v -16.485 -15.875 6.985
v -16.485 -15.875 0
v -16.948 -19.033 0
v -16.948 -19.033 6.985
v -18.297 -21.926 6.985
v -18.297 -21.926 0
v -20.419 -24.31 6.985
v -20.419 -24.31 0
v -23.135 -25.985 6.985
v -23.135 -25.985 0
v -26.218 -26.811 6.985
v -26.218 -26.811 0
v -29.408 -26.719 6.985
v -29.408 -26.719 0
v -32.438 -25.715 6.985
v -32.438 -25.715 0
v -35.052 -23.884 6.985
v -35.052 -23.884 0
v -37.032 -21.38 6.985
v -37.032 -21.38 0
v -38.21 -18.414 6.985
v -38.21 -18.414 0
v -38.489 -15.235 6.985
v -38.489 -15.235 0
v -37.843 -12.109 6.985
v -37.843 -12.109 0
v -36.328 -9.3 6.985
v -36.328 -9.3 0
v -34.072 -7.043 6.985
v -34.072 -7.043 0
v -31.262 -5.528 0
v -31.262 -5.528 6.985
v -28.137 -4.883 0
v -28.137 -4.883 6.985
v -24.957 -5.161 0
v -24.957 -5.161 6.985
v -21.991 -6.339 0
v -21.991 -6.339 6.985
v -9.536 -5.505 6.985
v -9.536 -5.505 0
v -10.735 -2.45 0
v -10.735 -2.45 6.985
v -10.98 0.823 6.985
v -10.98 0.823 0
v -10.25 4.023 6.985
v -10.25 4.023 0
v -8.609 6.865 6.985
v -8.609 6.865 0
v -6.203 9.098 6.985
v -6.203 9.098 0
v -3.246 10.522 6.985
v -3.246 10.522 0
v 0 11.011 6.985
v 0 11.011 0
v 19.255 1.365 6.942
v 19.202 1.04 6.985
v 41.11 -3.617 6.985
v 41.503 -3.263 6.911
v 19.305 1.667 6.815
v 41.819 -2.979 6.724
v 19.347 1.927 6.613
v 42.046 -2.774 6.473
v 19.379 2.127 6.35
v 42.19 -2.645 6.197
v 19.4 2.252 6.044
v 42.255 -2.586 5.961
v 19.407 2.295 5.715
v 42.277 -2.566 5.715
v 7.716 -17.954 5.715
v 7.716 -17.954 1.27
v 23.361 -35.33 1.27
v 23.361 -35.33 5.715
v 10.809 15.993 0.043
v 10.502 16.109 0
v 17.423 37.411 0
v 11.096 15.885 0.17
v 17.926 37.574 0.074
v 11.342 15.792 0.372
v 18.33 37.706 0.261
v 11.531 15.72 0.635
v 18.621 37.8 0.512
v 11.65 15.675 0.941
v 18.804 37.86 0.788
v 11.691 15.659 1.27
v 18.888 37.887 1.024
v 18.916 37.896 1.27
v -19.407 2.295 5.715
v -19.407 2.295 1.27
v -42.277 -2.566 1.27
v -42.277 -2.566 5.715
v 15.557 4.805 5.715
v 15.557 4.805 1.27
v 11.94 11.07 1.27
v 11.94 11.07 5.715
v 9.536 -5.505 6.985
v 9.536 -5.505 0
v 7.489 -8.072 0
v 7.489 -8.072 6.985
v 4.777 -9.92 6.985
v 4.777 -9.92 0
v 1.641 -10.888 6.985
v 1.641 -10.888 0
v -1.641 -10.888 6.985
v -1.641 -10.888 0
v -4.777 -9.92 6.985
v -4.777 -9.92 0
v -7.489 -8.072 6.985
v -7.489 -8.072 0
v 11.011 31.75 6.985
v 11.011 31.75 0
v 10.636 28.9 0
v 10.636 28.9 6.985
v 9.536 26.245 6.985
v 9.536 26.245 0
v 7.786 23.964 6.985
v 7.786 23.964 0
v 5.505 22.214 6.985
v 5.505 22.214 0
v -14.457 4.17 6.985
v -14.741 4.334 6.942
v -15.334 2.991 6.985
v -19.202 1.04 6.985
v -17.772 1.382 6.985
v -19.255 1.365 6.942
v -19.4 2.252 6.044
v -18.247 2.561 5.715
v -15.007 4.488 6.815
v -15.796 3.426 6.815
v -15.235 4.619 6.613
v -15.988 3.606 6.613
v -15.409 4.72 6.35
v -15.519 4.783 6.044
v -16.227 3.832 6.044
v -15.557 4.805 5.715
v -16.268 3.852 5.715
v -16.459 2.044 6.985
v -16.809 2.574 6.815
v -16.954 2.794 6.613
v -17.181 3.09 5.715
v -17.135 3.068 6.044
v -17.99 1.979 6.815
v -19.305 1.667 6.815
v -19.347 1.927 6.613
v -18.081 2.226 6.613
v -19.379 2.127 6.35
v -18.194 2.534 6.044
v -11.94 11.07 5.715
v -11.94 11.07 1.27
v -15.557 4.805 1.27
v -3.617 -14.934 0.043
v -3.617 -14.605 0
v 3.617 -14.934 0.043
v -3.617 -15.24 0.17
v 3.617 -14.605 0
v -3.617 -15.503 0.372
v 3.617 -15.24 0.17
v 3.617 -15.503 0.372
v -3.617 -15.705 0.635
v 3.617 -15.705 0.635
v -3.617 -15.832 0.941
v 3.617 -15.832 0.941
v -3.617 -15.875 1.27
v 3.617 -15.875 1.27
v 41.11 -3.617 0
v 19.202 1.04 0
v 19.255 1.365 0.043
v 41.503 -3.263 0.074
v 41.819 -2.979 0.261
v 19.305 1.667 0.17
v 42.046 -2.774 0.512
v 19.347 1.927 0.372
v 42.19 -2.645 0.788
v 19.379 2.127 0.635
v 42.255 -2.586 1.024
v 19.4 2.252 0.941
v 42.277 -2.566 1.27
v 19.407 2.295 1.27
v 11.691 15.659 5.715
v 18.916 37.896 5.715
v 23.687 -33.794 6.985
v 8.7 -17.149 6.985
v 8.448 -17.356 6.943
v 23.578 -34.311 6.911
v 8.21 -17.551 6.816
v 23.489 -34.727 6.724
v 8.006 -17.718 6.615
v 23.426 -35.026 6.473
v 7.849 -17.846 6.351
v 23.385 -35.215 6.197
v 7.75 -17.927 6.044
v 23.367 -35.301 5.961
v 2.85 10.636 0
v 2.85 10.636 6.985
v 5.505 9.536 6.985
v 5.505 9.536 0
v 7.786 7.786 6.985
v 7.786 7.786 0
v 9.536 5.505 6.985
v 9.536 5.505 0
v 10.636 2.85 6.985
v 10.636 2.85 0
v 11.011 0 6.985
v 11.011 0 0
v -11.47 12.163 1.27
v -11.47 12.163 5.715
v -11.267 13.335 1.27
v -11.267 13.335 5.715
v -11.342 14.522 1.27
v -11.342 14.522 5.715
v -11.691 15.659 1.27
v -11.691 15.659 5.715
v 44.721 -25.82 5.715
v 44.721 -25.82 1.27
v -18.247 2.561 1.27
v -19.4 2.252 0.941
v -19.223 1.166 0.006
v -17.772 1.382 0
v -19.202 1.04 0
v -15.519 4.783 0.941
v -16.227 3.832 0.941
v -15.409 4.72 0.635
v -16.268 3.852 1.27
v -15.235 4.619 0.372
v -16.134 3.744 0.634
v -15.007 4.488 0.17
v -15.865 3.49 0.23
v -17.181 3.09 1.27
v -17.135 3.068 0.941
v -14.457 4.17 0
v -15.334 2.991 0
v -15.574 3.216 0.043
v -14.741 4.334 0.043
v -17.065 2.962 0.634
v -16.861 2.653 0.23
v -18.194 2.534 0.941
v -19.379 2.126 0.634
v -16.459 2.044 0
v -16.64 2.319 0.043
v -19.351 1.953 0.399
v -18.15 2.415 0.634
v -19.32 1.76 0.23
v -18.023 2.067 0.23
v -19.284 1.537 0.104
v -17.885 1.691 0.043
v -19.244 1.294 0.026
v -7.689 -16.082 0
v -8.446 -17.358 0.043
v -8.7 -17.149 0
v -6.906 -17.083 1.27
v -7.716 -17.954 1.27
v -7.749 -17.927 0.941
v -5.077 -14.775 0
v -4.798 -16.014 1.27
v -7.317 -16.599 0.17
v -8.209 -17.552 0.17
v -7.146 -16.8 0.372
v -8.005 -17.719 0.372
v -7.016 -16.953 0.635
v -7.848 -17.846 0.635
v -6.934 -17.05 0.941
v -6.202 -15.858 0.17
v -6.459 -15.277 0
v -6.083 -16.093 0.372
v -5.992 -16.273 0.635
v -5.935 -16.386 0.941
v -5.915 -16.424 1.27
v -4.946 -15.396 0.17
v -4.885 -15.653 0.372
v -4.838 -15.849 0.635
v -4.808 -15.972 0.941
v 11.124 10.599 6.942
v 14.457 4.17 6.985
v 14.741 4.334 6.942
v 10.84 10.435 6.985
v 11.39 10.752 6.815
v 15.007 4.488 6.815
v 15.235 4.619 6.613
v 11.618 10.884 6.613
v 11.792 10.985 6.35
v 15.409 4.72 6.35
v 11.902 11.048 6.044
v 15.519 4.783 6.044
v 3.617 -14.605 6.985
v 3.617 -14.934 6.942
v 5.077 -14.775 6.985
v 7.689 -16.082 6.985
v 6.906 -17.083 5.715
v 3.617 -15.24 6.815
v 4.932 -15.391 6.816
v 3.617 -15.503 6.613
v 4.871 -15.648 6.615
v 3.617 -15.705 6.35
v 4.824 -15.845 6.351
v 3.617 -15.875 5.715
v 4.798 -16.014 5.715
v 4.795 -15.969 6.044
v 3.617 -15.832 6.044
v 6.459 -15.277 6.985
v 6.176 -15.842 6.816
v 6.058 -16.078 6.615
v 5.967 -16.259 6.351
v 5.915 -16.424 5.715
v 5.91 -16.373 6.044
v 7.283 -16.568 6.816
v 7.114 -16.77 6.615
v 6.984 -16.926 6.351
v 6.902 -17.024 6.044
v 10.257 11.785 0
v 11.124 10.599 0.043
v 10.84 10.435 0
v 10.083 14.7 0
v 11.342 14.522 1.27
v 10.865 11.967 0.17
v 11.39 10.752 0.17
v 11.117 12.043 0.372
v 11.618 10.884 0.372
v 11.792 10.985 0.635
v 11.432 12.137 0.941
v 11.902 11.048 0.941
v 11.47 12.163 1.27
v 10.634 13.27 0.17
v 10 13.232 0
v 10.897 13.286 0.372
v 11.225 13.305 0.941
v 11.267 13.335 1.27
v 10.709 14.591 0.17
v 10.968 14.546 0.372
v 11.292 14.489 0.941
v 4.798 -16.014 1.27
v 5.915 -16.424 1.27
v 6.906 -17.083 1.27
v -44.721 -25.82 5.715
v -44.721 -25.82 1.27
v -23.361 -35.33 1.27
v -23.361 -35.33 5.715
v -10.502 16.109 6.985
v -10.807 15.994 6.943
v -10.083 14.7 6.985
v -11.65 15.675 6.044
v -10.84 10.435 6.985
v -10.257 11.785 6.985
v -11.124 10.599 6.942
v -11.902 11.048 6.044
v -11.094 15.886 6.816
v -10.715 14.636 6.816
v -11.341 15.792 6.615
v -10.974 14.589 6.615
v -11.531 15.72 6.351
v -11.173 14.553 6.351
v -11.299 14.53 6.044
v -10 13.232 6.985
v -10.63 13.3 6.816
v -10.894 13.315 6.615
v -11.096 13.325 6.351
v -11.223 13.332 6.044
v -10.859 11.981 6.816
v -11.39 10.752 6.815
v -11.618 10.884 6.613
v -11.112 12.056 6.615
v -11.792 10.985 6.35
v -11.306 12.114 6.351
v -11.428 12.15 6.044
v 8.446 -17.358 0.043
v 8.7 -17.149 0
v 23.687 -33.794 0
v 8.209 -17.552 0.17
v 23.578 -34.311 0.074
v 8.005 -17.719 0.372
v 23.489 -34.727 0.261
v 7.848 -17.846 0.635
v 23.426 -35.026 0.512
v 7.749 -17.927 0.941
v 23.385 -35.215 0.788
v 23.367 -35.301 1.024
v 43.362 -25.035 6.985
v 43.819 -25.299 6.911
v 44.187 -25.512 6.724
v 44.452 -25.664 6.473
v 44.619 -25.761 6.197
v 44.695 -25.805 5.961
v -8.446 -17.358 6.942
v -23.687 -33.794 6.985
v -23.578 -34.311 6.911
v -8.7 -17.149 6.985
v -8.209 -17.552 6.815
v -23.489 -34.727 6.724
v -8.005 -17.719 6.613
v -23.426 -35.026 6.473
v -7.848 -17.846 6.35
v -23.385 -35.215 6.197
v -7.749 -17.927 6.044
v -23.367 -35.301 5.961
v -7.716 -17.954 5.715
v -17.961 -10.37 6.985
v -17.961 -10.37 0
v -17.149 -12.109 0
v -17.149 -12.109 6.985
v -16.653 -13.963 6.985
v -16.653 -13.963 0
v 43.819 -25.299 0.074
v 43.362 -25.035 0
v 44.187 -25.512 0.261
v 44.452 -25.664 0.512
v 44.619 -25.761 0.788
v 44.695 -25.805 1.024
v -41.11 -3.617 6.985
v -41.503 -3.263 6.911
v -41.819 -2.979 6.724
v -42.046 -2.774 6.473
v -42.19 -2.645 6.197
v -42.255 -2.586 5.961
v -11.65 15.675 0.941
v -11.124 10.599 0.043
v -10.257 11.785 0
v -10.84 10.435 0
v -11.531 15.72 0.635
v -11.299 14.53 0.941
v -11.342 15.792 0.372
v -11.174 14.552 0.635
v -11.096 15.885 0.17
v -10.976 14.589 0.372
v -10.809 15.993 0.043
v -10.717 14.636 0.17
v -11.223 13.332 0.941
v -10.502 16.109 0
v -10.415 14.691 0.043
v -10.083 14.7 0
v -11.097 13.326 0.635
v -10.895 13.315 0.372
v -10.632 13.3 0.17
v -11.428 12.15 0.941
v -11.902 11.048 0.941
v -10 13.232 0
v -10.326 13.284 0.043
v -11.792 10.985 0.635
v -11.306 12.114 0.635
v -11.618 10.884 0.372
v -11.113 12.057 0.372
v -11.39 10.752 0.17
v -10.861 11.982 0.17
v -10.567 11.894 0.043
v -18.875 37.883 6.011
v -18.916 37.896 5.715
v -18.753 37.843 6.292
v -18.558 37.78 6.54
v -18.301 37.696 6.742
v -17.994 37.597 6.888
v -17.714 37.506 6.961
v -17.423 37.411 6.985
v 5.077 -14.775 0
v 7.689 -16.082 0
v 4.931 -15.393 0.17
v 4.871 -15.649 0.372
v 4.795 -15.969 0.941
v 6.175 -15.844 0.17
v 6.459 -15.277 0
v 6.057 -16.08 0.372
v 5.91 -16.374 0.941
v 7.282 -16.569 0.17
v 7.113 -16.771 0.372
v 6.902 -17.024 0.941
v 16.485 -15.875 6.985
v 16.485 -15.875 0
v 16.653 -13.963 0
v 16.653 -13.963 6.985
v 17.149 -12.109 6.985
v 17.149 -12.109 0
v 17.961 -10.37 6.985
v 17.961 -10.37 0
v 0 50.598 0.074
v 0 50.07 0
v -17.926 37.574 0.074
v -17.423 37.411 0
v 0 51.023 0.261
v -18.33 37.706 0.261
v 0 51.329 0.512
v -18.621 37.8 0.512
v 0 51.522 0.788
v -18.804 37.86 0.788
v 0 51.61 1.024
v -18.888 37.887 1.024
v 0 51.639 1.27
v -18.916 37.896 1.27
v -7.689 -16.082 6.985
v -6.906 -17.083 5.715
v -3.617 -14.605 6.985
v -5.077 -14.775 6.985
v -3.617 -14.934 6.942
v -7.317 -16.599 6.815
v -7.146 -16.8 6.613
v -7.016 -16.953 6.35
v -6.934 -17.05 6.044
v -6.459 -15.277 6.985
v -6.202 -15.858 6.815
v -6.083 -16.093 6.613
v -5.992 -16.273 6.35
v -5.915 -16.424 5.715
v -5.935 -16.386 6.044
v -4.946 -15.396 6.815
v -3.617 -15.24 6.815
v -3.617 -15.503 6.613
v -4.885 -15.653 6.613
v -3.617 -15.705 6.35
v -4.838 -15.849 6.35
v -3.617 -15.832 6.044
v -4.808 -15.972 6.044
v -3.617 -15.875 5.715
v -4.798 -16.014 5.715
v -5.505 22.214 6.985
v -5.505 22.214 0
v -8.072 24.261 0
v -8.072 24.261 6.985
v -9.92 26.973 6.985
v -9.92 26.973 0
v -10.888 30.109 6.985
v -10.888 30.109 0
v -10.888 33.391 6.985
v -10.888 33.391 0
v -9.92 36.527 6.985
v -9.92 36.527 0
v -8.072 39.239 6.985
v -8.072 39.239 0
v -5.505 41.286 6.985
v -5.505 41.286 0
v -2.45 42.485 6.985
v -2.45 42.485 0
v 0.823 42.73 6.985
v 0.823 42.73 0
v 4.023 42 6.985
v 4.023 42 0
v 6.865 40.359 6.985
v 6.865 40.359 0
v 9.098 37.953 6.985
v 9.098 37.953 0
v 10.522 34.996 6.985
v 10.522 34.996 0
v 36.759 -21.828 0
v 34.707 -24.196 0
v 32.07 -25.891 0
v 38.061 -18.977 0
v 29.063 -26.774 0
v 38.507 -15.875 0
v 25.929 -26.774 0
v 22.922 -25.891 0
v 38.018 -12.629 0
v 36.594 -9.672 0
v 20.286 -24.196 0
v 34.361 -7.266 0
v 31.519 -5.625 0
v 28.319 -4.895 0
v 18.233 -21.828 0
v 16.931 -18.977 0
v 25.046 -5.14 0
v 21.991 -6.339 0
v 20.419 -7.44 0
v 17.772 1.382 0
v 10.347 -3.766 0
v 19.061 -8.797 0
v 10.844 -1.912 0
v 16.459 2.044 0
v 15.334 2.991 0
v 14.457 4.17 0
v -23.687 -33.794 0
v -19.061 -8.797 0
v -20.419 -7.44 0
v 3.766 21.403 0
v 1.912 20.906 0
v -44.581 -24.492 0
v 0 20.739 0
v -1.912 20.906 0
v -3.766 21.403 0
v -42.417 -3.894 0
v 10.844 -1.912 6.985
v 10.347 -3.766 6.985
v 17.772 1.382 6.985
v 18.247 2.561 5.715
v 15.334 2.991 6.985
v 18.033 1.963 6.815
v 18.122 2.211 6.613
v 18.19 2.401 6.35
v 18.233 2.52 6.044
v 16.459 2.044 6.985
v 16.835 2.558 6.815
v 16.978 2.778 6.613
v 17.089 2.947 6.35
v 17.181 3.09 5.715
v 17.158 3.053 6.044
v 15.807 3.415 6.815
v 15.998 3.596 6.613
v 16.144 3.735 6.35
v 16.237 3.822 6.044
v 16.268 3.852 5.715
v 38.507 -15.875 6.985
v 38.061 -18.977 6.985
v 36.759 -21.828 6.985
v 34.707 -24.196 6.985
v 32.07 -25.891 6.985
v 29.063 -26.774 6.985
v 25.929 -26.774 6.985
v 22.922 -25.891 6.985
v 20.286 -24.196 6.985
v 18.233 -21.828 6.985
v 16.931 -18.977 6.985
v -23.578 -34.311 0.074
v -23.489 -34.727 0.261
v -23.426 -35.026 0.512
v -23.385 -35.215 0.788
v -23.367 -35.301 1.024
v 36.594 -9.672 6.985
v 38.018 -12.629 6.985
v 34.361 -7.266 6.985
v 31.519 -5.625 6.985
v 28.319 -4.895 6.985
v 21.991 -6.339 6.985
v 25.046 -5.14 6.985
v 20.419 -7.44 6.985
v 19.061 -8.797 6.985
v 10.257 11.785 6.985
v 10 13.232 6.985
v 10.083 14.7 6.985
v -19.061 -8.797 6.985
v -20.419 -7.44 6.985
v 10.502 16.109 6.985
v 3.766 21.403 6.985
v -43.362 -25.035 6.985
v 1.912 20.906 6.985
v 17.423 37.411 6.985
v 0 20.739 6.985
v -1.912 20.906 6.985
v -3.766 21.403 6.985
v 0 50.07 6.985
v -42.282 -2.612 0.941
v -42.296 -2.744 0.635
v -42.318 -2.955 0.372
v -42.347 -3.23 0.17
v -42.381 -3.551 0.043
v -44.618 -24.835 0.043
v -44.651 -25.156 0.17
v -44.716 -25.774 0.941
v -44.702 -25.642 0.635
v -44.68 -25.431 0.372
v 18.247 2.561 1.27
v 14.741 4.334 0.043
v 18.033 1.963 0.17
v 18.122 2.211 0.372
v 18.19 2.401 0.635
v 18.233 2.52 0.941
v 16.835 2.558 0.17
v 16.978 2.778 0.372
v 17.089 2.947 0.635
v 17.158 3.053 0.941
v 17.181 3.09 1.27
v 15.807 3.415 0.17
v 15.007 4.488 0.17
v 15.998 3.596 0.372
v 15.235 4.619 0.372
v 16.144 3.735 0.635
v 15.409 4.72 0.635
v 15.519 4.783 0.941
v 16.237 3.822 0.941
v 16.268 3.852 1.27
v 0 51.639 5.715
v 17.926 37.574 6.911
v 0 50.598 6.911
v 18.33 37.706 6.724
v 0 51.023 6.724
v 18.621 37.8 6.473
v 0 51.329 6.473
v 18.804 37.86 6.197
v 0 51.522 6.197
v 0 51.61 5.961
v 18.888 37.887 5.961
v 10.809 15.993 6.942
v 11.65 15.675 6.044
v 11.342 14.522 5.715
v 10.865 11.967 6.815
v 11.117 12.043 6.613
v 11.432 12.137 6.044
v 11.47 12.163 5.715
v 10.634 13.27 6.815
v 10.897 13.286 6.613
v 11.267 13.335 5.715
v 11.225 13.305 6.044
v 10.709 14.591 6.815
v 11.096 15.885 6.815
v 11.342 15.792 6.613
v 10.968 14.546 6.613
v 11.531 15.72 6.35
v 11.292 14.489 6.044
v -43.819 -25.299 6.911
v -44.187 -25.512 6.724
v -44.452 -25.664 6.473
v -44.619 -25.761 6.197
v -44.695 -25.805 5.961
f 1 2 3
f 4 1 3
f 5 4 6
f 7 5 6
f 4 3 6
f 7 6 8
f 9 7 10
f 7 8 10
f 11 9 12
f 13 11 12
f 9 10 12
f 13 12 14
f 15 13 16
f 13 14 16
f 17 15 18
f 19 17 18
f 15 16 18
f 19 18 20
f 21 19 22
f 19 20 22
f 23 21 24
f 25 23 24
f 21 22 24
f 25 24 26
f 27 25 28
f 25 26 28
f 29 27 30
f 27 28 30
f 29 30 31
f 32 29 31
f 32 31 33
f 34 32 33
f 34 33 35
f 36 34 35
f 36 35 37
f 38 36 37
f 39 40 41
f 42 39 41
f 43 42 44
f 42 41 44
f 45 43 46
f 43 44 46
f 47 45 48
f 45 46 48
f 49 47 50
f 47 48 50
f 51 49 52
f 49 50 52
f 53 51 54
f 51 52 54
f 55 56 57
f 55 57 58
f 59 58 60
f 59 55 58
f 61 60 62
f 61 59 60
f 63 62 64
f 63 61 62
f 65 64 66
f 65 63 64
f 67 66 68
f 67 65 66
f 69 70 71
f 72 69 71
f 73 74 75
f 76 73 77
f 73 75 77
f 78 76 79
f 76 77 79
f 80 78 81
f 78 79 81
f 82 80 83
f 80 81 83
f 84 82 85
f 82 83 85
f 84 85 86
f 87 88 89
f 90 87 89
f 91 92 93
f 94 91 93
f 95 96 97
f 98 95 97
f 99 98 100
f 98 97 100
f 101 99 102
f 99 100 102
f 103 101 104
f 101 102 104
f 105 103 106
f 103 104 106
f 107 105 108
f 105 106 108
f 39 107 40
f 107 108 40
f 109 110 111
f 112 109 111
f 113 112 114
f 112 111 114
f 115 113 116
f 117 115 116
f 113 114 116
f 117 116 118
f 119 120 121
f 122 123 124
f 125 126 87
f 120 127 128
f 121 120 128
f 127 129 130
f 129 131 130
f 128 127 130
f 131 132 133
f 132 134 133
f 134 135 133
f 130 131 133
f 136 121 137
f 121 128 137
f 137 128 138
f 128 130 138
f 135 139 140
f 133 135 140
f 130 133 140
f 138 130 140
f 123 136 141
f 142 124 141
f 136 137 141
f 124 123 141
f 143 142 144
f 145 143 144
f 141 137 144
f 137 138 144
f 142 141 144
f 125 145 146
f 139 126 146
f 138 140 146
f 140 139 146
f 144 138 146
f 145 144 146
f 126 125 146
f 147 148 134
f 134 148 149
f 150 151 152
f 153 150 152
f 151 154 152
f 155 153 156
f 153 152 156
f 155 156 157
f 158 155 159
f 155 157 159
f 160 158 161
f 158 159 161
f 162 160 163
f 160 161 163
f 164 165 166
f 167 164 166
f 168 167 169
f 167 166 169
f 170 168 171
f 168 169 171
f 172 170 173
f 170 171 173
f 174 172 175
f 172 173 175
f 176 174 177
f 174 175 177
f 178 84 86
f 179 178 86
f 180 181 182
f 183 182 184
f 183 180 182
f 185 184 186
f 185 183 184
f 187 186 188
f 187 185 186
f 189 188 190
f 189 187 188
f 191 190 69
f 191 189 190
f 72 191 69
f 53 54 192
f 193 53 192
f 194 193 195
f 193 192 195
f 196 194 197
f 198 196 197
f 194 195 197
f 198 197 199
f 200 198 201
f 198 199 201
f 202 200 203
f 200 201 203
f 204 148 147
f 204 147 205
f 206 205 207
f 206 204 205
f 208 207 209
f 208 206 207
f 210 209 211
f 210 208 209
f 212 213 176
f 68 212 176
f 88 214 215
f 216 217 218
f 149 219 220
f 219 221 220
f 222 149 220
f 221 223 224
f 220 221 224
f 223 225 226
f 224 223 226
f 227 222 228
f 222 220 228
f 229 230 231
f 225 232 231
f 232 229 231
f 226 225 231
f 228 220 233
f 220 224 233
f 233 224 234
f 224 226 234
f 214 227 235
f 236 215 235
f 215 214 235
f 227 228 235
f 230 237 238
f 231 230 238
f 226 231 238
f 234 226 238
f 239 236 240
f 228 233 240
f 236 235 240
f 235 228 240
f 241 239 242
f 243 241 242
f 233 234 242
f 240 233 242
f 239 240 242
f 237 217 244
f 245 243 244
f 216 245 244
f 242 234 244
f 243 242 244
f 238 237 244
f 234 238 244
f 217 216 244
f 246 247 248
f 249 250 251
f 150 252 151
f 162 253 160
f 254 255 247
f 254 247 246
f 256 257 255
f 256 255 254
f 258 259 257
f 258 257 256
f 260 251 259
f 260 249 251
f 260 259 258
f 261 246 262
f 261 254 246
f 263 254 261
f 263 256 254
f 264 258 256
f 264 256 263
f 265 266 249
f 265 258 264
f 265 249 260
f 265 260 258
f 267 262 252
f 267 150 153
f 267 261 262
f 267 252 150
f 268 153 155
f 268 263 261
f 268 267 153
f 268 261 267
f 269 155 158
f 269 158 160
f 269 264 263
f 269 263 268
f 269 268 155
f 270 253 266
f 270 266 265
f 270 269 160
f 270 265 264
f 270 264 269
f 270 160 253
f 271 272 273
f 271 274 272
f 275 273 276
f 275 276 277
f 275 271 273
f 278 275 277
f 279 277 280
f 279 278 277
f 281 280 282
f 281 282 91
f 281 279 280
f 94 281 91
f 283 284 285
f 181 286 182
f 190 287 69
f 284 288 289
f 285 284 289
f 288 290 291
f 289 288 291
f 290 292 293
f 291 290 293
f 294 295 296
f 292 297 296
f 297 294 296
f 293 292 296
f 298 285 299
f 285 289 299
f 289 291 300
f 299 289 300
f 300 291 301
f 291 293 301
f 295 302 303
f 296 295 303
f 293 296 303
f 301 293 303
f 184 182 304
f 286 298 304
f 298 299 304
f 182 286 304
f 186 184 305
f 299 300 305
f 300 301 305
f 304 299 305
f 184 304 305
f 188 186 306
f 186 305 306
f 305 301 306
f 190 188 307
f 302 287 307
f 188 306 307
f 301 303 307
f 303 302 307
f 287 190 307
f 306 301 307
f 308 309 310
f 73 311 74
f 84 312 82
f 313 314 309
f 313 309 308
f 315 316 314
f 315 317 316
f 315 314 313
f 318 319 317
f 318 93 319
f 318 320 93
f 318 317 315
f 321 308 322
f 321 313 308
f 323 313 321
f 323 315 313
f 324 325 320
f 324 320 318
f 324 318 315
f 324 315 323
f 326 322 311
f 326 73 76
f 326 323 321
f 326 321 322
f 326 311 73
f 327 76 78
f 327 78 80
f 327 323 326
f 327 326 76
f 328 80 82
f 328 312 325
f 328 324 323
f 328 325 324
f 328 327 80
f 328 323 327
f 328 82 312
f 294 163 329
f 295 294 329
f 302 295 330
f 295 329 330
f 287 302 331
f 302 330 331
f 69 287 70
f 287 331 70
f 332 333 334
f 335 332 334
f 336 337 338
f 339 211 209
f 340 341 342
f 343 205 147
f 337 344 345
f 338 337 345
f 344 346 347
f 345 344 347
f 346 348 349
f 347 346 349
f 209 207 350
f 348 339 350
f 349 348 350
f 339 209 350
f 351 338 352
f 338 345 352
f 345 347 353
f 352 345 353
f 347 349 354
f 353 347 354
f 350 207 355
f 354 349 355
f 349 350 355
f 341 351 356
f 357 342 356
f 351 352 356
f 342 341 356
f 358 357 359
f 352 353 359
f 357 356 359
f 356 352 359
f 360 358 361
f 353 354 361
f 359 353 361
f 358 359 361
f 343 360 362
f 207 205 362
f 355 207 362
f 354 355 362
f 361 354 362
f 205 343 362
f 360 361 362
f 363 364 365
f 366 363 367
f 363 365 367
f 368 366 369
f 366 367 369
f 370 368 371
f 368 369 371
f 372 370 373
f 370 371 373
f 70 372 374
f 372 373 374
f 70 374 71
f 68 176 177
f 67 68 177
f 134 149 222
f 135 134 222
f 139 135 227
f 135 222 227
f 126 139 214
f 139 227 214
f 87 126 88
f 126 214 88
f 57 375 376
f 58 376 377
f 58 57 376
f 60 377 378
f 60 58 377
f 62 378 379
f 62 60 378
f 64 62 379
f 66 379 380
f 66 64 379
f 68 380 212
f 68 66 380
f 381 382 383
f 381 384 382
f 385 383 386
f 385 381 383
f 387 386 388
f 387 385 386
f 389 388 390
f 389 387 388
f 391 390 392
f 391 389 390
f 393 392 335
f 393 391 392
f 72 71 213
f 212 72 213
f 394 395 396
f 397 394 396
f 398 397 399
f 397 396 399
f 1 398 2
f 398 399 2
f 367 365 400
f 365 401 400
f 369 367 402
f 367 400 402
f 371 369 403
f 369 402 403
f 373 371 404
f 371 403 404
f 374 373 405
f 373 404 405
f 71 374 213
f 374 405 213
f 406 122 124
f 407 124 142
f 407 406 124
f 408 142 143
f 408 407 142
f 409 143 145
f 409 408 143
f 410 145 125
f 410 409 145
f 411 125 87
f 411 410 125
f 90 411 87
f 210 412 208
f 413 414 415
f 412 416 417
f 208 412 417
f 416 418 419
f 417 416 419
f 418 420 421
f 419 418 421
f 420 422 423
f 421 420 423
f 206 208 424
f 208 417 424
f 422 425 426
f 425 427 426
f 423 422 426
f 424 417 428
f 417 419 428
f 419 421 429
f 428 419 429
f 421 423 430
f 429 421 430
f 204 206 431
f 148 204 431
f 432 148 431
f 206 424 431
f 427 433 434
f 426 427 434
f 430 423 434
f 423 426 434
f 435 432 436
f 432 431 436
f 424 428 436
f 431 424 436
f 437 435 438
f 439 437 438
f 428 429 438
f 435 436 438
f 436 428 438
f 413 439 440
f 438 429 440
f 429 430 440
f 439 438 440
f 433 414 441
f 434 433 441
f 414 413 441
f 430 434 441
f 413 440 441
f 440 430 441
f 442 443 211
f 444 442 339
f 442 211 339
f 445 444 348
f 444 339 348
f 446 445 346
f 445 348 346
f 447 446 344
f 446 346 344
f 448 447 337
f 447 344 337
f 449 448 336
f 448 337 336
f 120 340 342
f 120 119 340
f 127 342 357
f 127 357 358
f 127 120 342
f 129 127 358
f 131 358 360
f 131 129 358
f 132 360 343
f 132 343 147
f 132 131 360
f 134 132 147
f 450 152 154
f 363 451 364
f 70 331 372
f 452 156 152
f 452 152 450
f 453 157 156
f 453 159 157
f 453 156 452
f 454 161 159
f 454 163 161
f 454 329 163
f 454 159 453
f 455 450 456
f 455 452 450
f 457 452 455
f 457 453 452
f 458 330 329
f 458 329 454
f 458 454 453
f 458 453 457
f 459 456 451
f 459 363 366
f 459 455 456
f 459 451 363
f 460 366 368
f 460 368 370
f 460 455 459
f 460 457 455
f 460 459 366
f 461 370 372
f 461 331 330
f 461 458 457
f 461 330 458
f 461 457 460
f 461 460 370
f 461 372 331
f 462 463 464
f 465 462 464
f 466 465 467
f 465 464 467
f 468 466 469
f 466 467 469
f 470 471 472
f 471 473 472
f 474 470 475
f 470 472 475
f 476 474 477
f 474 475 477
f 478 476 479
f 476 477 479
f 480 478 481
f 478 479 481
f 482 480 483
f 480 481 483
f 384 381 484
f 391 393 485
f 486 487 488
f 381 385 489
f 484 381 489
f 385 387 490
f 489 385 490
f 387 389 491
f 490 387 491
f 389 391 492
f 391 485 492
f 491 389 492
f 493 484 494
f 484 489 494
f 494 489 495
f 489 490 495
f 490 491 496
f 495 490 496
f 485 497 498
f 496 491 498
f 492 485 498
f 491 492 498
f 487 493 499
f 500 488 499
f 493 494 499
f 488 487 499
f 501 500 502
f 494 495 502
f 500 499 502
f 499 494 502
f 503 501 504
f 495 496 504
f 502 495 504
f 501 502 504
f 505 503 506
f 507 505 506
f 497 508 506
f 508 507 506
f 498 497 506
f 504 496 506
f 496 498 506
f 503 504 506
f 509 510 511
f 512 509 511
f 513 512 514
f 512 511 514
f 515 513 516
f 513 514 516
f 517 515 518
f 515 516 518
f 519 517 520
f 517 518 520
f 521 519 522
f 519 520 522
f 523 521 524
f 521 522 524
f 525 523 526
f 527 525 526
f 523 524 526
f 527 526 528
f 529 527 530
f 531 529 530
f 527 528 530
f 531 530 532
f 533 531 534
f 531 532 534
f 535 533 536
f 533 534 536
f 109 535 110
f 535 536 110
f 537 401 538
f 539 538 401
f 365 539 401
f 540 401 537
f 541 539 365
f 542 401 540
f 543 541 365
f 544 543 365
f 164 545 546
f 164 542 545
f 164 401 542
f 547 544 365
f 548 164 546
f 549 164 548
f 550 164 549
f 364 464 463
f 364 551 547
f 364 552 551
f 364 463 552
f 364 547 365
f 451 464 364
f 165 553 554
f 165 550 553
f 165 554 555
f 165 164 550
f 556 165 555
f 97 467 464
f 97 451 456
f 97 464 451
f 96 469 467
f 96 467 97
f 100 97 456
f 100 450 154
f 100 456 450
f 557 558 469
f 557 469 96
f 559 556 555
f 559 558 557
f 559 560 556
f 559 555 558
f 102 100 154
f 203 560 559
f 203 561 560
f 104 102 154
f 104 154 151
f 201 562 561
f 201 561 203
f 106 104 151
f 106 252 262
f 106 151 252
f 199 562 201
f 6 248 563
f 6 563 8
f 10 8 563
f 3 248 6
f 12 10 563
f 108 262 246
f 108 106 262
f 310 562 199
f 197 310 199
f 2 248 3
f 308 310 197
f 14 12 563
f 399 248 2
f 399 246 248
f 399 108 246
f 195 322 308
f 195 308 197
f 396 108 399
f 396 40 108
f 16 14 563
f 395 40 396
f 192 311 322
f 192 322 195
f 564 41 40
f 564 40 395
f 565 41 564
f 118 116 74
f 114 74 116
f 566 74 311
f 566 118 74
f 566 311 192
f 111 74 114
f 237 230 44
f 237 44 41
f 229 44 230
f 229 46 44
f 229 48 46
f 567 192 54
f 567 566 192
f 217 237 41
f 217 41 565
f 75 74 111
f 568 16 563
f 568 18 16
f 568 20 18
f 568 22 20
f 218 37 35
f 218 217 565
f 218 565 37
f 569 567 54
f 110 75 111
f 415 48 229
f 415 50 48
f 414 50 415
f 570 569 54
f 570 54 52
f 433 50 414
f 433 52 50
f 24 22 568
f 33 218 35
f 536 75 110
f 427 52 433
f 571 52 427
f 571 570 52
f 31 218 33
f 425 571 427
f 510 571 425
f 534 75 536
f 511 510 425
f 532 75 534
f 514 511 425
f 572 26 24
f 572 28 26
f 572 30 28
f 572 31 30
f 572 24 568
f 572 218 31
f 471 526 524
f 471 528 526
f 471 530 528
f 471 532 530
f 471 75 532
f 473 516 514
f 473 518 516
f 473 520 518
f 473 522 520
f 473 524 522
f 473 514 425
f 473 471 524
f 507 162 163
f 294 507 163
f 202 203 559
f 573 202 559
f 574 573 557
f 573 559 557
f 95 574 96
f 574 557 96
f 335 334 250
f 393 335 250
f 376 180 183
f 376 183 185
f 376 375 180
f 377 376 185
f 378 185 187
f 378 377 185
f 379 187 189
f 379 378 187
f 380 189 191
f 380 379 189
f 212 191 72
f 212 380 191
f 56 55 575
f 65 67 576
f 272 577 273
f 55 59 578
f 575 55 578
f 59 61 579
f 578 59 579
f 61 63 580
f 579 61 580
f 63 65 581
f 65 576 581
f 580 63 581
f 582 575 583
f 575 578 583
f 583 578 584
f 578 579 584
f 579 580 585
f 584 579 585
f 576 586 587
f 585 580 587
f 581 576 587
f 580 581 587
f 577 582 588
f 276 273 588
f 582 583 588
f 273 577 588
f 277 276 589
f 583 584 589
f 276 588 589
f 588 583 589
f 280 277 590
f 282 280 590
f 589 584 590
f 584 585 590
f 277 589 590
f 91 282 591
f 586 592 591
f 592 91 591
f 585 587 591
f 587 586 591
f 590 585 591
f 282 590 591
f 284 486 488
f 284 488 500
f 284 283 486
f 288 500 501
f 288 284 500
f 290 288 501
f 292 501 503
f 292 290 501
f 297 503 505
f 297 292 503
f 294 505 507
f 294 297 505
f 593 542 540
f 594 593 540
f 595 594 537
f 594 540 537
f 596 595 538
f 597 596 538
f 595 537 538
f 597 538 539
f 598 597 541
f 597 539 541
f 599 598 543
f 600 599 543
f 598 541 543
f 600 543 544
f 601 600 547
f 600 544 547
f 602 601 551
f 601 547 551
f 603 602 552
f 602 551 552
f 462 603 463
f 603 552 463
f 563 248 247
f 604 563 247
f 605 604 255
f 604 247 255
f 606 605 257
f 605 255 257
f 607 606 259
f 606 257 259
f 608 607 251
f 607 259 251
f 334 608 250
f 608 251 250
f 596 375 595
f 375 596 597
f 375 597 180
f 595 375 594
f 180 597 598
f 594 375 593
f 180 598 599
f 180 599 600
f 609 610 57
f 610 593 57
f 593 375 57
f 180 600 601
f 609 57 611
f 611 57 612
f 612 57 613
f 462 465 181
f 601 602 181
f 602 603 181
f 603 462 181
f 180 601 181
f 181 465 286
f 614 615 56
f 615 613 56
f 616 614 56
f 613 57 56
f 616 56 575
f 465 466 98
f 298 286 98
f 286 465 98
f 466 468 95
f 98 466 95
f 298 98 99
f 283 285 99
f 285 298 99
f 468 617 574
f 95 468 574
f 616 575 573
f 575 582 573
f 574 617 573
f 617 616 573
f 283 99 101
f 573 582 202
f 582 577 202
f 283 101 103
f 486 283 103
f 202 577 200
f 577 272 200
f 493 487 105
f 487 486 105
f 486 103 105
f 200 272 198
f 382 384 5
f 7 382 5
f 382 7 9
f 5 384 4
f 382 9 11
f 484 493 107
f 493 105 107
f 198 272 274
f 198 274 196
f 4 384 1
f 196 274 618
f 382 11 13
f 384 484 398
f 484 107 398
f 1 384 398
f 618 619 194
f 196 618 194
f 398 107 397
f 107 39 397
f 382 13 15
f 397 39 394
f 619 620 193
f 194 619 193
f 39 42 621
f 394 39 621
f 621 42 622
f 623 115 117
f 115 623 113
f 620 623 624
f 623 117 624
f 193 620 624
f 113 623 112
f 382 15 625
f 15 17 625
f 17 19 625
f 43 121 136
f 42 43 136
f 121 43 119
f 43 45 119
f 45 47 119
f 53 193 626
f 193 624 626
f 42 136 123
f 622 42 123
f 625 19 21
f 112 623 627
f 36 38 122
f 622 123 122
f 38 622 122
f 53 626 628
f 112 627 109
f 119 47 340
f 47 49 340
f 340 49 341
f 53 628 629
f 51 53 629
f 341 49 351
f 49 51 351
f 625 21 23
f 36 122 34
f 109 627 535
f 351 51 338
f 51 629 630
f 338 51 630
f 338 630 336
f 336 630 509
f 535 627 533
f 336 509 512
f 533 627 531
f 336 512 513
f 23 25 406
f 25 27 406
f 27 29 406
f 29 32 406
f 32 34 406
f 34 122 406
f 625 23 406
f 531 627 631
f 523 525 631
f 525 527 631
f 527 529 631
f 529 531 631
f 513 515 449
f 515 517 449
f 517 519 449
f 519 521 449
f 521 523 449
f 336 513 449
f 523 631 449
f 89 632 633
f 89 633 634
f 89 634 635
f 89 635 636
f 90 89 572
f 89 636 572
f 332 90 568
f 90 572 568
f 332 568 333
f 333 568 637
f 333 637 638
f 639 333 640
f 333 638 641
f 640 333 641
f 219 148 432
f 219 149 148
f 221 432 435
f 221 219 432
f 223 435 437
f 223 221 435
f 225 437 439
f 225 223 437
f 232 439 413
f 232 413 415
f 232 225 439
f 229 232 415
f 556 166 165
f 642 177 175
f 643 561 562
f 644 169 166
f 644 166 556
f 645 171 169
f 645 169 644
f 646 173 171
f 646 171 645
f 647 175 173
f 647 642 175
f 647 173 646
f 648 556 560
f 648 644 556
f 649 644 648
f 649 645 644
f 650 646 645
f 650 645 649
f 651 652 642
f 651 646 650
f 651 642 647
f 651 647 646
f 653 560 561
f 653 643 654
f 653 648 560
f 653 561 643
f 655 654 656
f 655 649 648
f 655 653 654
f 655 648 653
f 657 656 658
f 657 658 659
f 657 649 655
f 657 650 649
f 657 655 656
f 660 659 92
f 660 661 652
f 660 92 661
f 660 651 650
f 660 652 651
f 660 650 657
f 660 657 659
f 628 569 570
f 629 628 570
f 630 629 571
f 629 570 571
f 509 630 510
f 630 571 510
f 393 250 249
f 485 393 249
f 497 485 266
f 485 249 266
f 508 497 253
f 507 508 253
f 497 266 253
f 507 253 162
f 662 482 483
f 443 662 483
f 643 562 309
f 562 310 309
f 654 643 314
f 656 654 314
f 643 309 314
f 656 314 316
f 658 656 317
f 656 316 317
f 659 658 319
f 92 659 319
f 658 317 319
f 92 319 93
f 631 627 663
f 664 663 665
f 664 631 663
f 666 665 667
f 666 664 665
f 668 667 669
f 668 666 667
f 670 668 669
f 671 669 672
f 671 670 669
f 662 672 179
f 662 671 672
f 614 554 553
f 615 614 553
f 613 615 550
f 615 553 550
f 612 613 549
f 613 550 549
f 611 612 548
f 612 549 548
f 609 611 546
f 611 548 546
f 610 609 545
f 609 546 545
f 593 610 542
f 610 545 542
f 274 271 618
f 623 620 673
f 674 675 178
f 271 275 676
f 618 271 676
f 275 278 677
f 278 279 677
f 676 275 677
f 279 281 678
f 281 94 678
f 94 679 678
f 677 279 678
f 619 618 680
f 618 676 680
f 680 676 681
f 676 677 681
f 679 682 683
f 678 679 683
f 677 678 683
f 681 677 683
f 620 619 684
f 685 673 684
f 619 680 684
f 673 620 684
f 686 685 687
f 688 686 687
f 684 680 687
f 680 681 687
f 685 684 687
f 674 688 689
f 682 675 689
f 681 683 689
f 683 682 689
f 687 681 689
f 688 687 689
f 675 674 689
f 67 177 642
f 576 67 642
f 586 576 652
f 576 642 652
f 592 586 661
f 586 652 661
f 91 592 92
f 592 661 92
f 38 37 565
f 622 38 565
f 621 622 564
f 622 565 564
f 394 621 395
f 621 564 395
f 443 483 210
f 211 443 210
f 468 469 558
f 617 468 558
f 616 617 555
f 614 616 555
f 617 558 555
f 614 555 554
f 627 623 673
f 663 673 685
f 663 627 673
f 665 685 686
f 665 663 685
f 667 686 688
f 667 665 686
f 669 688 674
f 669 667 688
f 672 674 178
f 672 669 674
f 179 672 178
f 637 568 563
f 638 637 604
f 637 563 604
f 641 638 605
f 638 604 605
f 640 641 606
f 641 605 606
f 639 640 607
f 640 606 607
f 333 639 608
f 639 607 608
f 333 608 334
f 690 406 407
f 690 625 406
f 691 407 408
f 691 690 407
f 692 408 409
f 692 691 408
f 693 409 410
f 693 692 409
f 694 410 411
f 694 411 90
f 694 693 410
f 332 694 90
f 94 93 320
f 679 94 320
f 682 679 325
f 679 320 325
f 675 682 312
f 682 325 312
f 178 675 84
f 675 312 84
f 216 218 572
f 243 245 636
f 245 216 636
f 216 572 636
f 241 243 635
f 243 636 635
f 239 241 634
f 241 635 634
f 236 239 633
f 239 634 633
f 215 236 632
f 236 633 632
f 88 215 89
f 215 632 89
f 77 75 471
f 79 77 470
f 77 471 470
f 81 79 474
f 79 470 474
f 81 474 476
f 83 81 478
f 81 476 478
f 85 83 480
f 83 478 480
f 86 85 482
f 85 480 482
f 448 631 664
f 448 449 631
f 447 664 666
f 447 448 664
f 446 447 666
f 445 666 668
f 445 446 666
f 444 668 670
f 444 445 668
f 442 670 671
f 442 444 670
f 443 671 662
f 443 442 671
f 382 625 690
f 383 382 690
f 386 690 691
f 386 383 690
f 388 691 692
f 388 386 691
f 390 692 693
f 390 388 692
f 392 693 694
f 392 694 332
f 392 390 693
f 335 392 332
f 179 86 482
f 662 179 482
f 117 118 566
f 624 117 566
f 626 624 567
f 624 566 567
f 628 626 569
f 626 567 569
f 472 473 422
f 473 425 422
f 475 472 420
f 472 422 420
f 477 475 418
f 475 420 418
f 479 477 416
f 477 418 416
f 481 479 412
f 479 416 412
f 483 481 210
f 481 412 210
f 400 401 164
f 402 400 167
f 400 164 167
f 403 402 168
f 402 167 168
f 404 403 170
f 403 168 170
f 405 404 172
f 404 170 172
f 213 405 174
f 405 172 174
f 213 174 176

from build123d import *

# Parameters (mm, degrees)
F1_DEPTH    = 6.985
F2_T1_DEPTH = 6.985
F3_R        = 1.27
F4_R        = 1.27


# Not quite as in the source:
# - a fillet or chamfer that OpenCascade refuses, or shapes differently, is made with other operations: its cross-section is extruded or revolved along the edge and cut away or added
# - a feature names something its author has since deleted; it is built from what else it names


with BuildPart() as f1:
    # F0 (on Top) → F1 (new body)
    with BuildSketch(Plane.XY):
        with BuildLine():
            Line((0, 15.6591), (0, 11.0109))
            ThreePointArc((0, 11.0109), (7.785882057, 7.785882057), (11.0109, 0))
            ThreePointArc((11.0109, 0), (10.6357126807, -2.8498306237), (9.5357191185, -5.50545))
            Line((9.5357191185, -5.50545), (13.5611784004, -7.82955))
            Line((13.5611784004, -7.82955), (18.2062211237, 0.2159))
            Line((18.2062211237, 0.2159), (9.2900854465, 15.6591))
            Line((9.2900854465, 15.6591), (0, 15.6591))
        make_face()
        with BuildLine():
            ThreePointArc((-9.5357191185, -5.50545), (-9.5357191185, 5.50545), (0, 11.0109))
            Line((0, 11.0109), (0, 15.6591))
            Line((0, 15.6591), (-9.2900854465, 15.6591))
            Line((-9.2900854465, 15.6591), (-18.2062211237, 0.2159))
            Line((-18.2062211237, 0.2159), (-13.5611784004, -7.82955))
            Line((-13.5611784004, -7.82955), (-9.5357191185, -5.50545))
        make_face()
        with BuildLine():
            Line((13.5611784004, -7.82955), (9.5357191185, -5.50545))
            ThreePointArc((9.5357191185, -5.50545), (0, -11.0109), (-9.5357191185, -5.50545))
            Line((-9.5357191185, -5.50545), (-13.5611784004, -7.82955))
            Line((-13.5611784004, -7.82955), (-8.9161356771, -15.875))
            Line((-8.9161356771, -15.875), (8.9161356771, -15.875))
            Line((8.9161356771, -15.875), (13.5611784004, -7.82955))
        make_face()
        with BuildLine():
            Line((-9.2900854465, 15.6591), (0, 15.6591))
            Line((0, 15.6591), (0, 20.7391))
            ThreePointArc((0, 20.7391), (-2.8498306237, 21.1142873193), (-5.50545, 22.2142808815))
            Line((-5.50545, 22.2142808815), (-9.2900854465, 15.6591))
        make_face()
        with BuildLine():
            Line((0, 20.7391), (0, 15.6591))
            Line((0, 15.6591), (9.2900854465, 15.6591))
            Line((9.2900854465, 15.6591), (5.50545, 22.2142808815))
            ThreePointArc((5.50545, 22.2142808815), (2.8498306237, 21.1142873193), (0, 20.7391))
        make_face()
        with BuildLine():
            Line((18.2062211237, 0.2159), (13.5611784004, -7.82955))
            Line((13.5611784004, -7.82955), (17.9605874516, -10.36955))
            ThreePointArc((17.9605874516, -10.36955), (19.7104245132, -8.089117943), (21.9908565702, -6.3392808815))
            Line((21.9908565702, -6.3392808815), (18.2062211237, 0.2159))
        make_face()
        with BuildLine():
            Line((17.9605874516, -10.36955), (13.5611784004, -7.82955))
            Line((13.5611784004, -7.82955), (8.9161356771, -15.875))
            Line((8.9161356771, -15.875), (16.4854065702, -15.875))
            ThreePointArc((16.4854065702, -15.875), (16.8605938895, -13.0251693763), (17.9605874516, -10.36955))
        make_face()
        with BuildLine():
            Line((-8.9161356771, -15.875), (-13.5611784004, -7.82955))
            Line((-13.5611784004, -7.82955), (-17.9605874516, -10.36955))
            ThreePointArc((-17.9605874516, -10.36955), (-16.8605938895, -13.0251693763), (-16.4854065702, -15.875))
            Line((-16.4854065702, -15.875), (-8.9161356771, -15.875))
        make_face()
        with BuildLine():
            Line((-17.9605874516, -10.36955), (-13.5611784004, -7.82955))
            Line((-13.5611784004, -7.82955), (-18.2062211237, 0.2159))
            Line((-18.2062211237, 0.2159), (-21.9908565702, -6.3392808815))
            ThreePointArc((-21.9908565702, -6.3392808815), (-19.7104245132, -8.089117943), (-17.9605874516, -10.36955))
        make_face()
        with BuildLine():
            Line((5.50545, 22.2142808815), (9.2900854465, 15.6591))
            Line((9.2900854465, 15.6591), (11.6907231639, 15.6591))
            Line((11.6907231639, 15.6591), (18.9159874322, 37.8961768904))
            Line((18.9159874322, 37.8961768904), (0, 51.6394462192))
            Line((0, 51.6394462192), (-18.9159874322, 37.8961768904))
            Line((-18.9159874322, 37.8961768904), (-11.6907231639, 15.6591))
            Line((-11.6907231639, 15.6591), (-9.2900854465, 15.6591))
            Line((-9.2900854465, 15.6591), (-5.50545, 22.2142808815))
            ThreePointArc((-5.50545, 22.2142808815), (-5.50545, 41.2857191185), (11.0109, 31.75))
            ThreePointArc((11.0109, 31.75), (9.5357191185, 26.24455), (5.50545, 22.2142808815))
        make_face()
        with BuildLine():
            Line((16.4854065702, -15.875), (8.9161356771, -15.875))
            Line((8.9161356771, -15.875), (7.7158168185, -17.9540132485))
            Line((7.7158168185, -17.9540132485), (23.3610581773, -35.3298140992))
            Line((23.3610581773, -35.3298140992), (44.7210722631, -25.8197231096))
            Line((44.7210722631, -25.8197231096), (42.2770456095, -2.5663627912))
            Line((42.2770456095, -2.5663627912), (19.4065399823, 2.2949132485))
            Line((19.4065399823, 2.2949132485), (18.2062211237, 0.2159))
            Line((18.2062211237, 0.2159), (21.9908565702, -6.3392808815))
            ThreePointArc((21.9908565702, -6.3392808815), (33.0017565702, -6.3392808815), (38.5072065702, -15.875))
            ThreePointArc((38.5072065702, -15.875), (27.4963065702, -26.8859), (16.4854065702, -15.875))
        make_face()
        with BuildLine():
            Line((-21.9908565702, -6.3392808815), (-18.2062211237, 0.2159))
            Line((-18.2062211237, 0.2159), (-19.4065399823, 2.2949132485))
            Line((-19.4065399823, 2.2949132485), (-42.2770456095, -2.5663627912))
            Line((-42.2770456095, -2.5663627912), (-44.7210722631, -25.8197231096))
            Line((-44.7210722631, -25.8197231096), (-23.3610581773, -35.3298140992))
            Line((-23.3610581773, -35.3298140992), (-7.7158168185, -17.9540132485))
            Line((-7.7158168185, -17.9540132485), (-8.9161356771, -15.875))
            Line((-8.9161356771, -15.875), (-16.4854065702, -15.875))
            ThreePointArc((-16.4854065702, -15.875), (-37.0320256887, -21.38045), (-21.9908565702, -6.3392808815))
        make_face()
    extrude(amount=F1_DEPTH)

    # F2: fillet of radius 5.08 on 6 edges, made by hand

    # F2_s2 → F2_t1 (join)
    with BuildSketch(Plane.XY):
        with BuildLine():
            ThreePointArc((-11.9396642154, 11.0698949536), (-11.2665307911, 13.3347353028), (-11.6907231639, 15.6591))
            Line((-11.6907231639, 15.6591), (-9.2900854465, 15.6591))
            Line((-9.2900854465, 15.6591), (-11.9396642154, 11.0698949536))
        make_face()
        with BuildLine():
            ThreePointArc((-15.5566423547, 4.8051050464), (-17.1814849205, 3.0897342262), (-19.4065399823, 2.2949132485))
            Line((-19.4065399823, 2.2949132485), (-18.2062211237, 0.2159))
            Line((-18.2062211237, 0.2159), (-15.5566423547, 4.8051050464))
        make_face()
        with BuildLine():
            ThreePointArc((-7.7158168185, -17.9540132485), (-5.9149541295, -16.424469529), (-3.6169781393, -15.875))
            Line((-3.6169781393, -15.875), (-8.9161356771, -15.875))
            Line((-8.9161356771, -15.875), (-7.7158168185, -17.9540132485))
        make_face()
        with BuildLine():
            ThreePointArc((3.6169781393, -15.875), (5.9149541295, -16.424469529), (7.7158168185, -17.9540132485))
            Line((7.7158168185, -17.9540132485), (8.9161356771, -15.875))
            Line((8.9161356771, -15.875), (3.6169781393, -15.875))
        make_face()
        with BuildLine():
            ThreePointArc((19.4065399823, 2.2949132485), (17.1814849205, 3.0897342262), (15.5566423547, 4.8051050464))
            Line((15.5566423547, 4.8051050464), (18.2062211237, 0.2159))
            Line((18.2062211237, 0.2159), (19.4065399823, 2.2949132485))
        make_face()
        with BuildLine():
            ThreePointArc((11.9396642154, 11.0698949536), (11.2665307911, 13.3347353028), (11.6907231639, 15.6591))
            Line((11.6907231639, 15.6591), (9.2900854465, 15.6591))
            Line((9.2900854465, 15.6591), (11.9396642154, 11.0698949536))
        make_face()
    extrude(amount=F2_T1_DEPTH)

    # F3
    f3_edges = [f1.edges().sort_by_distance(p)[0] for p in [
        (9.457994, 44.767812, 6.985),
        (15.303355, 26.777638, 6.985),
        (13.748153, 7.9375, 6.985),
        (11.266531, 13.334735, 6.985),
        (17.181485, 3.089734, 6.985),
        (30.841793, -0.135725, 6.985),
        (43.499059, -14.193043, 6.985),
        (34.041065, -30.574769, 6.985),
        (15.538437, -26.641914, 6.985),
        (0, -15.875, 6.985),
        (-5.914954, -16.42447, 6.985),
        (-15.538437, -26.641914, 6.985),
        (-34.041065, -30.574769, 6.985),
        (-43.499059, -14.193043, 6.985),
        (-30.841793, -0.135725, 6.985),
        (-17.181485, 3.089734, 6.985),
        (-13.748153, 7.9375, 6.985),
        (-11.266531, 13.334735, 6.985),
        (-15.303355, 26.777638, 6.985),
        (-9.457994, 44.767812, 6.985),
        (5.914954, -16.42447, 6.985),
    ]]
    fillet(f3_edges, radius=F3_R)

    # F4
    f4_edges = [f1.edges().sort_by_distance(p)[0] for p in [
        (43.499059, -14.193043, 0),
        (34.041065, -30.574769, 0),
        (15.538437, -26.641914, 0),
        (30.841793, -0.135725, 0),
        (15.303355, 26.777638, 0),
        (9.457994, 44.767812, 0),
        (-9.457994, 44.767812, 0),
        (-15.303355, 26.777638, 0),
        (-13.748153, 7.9375, 0),
        (-30.841793, -0.135725, 0),
        (-34.041065, -30.574769, 0),
        (-15.538437, -26.641914, 0),
        (0, -15.875, 0),
        (13.748153, 7.9375, 0),
        (11.266531, 13.334735, 0),
        (-11.266531, 13.334735, 0),
        (17.181485, 3.089734, 0),
        (-17.181485, 3.089734, 0),
        (5.914954, -16.42447, 0),
        (-5.914954, -16.42447, 0),
    ]]
    fillet(f4_edges, radius=F4_R)


solid = f1.part
